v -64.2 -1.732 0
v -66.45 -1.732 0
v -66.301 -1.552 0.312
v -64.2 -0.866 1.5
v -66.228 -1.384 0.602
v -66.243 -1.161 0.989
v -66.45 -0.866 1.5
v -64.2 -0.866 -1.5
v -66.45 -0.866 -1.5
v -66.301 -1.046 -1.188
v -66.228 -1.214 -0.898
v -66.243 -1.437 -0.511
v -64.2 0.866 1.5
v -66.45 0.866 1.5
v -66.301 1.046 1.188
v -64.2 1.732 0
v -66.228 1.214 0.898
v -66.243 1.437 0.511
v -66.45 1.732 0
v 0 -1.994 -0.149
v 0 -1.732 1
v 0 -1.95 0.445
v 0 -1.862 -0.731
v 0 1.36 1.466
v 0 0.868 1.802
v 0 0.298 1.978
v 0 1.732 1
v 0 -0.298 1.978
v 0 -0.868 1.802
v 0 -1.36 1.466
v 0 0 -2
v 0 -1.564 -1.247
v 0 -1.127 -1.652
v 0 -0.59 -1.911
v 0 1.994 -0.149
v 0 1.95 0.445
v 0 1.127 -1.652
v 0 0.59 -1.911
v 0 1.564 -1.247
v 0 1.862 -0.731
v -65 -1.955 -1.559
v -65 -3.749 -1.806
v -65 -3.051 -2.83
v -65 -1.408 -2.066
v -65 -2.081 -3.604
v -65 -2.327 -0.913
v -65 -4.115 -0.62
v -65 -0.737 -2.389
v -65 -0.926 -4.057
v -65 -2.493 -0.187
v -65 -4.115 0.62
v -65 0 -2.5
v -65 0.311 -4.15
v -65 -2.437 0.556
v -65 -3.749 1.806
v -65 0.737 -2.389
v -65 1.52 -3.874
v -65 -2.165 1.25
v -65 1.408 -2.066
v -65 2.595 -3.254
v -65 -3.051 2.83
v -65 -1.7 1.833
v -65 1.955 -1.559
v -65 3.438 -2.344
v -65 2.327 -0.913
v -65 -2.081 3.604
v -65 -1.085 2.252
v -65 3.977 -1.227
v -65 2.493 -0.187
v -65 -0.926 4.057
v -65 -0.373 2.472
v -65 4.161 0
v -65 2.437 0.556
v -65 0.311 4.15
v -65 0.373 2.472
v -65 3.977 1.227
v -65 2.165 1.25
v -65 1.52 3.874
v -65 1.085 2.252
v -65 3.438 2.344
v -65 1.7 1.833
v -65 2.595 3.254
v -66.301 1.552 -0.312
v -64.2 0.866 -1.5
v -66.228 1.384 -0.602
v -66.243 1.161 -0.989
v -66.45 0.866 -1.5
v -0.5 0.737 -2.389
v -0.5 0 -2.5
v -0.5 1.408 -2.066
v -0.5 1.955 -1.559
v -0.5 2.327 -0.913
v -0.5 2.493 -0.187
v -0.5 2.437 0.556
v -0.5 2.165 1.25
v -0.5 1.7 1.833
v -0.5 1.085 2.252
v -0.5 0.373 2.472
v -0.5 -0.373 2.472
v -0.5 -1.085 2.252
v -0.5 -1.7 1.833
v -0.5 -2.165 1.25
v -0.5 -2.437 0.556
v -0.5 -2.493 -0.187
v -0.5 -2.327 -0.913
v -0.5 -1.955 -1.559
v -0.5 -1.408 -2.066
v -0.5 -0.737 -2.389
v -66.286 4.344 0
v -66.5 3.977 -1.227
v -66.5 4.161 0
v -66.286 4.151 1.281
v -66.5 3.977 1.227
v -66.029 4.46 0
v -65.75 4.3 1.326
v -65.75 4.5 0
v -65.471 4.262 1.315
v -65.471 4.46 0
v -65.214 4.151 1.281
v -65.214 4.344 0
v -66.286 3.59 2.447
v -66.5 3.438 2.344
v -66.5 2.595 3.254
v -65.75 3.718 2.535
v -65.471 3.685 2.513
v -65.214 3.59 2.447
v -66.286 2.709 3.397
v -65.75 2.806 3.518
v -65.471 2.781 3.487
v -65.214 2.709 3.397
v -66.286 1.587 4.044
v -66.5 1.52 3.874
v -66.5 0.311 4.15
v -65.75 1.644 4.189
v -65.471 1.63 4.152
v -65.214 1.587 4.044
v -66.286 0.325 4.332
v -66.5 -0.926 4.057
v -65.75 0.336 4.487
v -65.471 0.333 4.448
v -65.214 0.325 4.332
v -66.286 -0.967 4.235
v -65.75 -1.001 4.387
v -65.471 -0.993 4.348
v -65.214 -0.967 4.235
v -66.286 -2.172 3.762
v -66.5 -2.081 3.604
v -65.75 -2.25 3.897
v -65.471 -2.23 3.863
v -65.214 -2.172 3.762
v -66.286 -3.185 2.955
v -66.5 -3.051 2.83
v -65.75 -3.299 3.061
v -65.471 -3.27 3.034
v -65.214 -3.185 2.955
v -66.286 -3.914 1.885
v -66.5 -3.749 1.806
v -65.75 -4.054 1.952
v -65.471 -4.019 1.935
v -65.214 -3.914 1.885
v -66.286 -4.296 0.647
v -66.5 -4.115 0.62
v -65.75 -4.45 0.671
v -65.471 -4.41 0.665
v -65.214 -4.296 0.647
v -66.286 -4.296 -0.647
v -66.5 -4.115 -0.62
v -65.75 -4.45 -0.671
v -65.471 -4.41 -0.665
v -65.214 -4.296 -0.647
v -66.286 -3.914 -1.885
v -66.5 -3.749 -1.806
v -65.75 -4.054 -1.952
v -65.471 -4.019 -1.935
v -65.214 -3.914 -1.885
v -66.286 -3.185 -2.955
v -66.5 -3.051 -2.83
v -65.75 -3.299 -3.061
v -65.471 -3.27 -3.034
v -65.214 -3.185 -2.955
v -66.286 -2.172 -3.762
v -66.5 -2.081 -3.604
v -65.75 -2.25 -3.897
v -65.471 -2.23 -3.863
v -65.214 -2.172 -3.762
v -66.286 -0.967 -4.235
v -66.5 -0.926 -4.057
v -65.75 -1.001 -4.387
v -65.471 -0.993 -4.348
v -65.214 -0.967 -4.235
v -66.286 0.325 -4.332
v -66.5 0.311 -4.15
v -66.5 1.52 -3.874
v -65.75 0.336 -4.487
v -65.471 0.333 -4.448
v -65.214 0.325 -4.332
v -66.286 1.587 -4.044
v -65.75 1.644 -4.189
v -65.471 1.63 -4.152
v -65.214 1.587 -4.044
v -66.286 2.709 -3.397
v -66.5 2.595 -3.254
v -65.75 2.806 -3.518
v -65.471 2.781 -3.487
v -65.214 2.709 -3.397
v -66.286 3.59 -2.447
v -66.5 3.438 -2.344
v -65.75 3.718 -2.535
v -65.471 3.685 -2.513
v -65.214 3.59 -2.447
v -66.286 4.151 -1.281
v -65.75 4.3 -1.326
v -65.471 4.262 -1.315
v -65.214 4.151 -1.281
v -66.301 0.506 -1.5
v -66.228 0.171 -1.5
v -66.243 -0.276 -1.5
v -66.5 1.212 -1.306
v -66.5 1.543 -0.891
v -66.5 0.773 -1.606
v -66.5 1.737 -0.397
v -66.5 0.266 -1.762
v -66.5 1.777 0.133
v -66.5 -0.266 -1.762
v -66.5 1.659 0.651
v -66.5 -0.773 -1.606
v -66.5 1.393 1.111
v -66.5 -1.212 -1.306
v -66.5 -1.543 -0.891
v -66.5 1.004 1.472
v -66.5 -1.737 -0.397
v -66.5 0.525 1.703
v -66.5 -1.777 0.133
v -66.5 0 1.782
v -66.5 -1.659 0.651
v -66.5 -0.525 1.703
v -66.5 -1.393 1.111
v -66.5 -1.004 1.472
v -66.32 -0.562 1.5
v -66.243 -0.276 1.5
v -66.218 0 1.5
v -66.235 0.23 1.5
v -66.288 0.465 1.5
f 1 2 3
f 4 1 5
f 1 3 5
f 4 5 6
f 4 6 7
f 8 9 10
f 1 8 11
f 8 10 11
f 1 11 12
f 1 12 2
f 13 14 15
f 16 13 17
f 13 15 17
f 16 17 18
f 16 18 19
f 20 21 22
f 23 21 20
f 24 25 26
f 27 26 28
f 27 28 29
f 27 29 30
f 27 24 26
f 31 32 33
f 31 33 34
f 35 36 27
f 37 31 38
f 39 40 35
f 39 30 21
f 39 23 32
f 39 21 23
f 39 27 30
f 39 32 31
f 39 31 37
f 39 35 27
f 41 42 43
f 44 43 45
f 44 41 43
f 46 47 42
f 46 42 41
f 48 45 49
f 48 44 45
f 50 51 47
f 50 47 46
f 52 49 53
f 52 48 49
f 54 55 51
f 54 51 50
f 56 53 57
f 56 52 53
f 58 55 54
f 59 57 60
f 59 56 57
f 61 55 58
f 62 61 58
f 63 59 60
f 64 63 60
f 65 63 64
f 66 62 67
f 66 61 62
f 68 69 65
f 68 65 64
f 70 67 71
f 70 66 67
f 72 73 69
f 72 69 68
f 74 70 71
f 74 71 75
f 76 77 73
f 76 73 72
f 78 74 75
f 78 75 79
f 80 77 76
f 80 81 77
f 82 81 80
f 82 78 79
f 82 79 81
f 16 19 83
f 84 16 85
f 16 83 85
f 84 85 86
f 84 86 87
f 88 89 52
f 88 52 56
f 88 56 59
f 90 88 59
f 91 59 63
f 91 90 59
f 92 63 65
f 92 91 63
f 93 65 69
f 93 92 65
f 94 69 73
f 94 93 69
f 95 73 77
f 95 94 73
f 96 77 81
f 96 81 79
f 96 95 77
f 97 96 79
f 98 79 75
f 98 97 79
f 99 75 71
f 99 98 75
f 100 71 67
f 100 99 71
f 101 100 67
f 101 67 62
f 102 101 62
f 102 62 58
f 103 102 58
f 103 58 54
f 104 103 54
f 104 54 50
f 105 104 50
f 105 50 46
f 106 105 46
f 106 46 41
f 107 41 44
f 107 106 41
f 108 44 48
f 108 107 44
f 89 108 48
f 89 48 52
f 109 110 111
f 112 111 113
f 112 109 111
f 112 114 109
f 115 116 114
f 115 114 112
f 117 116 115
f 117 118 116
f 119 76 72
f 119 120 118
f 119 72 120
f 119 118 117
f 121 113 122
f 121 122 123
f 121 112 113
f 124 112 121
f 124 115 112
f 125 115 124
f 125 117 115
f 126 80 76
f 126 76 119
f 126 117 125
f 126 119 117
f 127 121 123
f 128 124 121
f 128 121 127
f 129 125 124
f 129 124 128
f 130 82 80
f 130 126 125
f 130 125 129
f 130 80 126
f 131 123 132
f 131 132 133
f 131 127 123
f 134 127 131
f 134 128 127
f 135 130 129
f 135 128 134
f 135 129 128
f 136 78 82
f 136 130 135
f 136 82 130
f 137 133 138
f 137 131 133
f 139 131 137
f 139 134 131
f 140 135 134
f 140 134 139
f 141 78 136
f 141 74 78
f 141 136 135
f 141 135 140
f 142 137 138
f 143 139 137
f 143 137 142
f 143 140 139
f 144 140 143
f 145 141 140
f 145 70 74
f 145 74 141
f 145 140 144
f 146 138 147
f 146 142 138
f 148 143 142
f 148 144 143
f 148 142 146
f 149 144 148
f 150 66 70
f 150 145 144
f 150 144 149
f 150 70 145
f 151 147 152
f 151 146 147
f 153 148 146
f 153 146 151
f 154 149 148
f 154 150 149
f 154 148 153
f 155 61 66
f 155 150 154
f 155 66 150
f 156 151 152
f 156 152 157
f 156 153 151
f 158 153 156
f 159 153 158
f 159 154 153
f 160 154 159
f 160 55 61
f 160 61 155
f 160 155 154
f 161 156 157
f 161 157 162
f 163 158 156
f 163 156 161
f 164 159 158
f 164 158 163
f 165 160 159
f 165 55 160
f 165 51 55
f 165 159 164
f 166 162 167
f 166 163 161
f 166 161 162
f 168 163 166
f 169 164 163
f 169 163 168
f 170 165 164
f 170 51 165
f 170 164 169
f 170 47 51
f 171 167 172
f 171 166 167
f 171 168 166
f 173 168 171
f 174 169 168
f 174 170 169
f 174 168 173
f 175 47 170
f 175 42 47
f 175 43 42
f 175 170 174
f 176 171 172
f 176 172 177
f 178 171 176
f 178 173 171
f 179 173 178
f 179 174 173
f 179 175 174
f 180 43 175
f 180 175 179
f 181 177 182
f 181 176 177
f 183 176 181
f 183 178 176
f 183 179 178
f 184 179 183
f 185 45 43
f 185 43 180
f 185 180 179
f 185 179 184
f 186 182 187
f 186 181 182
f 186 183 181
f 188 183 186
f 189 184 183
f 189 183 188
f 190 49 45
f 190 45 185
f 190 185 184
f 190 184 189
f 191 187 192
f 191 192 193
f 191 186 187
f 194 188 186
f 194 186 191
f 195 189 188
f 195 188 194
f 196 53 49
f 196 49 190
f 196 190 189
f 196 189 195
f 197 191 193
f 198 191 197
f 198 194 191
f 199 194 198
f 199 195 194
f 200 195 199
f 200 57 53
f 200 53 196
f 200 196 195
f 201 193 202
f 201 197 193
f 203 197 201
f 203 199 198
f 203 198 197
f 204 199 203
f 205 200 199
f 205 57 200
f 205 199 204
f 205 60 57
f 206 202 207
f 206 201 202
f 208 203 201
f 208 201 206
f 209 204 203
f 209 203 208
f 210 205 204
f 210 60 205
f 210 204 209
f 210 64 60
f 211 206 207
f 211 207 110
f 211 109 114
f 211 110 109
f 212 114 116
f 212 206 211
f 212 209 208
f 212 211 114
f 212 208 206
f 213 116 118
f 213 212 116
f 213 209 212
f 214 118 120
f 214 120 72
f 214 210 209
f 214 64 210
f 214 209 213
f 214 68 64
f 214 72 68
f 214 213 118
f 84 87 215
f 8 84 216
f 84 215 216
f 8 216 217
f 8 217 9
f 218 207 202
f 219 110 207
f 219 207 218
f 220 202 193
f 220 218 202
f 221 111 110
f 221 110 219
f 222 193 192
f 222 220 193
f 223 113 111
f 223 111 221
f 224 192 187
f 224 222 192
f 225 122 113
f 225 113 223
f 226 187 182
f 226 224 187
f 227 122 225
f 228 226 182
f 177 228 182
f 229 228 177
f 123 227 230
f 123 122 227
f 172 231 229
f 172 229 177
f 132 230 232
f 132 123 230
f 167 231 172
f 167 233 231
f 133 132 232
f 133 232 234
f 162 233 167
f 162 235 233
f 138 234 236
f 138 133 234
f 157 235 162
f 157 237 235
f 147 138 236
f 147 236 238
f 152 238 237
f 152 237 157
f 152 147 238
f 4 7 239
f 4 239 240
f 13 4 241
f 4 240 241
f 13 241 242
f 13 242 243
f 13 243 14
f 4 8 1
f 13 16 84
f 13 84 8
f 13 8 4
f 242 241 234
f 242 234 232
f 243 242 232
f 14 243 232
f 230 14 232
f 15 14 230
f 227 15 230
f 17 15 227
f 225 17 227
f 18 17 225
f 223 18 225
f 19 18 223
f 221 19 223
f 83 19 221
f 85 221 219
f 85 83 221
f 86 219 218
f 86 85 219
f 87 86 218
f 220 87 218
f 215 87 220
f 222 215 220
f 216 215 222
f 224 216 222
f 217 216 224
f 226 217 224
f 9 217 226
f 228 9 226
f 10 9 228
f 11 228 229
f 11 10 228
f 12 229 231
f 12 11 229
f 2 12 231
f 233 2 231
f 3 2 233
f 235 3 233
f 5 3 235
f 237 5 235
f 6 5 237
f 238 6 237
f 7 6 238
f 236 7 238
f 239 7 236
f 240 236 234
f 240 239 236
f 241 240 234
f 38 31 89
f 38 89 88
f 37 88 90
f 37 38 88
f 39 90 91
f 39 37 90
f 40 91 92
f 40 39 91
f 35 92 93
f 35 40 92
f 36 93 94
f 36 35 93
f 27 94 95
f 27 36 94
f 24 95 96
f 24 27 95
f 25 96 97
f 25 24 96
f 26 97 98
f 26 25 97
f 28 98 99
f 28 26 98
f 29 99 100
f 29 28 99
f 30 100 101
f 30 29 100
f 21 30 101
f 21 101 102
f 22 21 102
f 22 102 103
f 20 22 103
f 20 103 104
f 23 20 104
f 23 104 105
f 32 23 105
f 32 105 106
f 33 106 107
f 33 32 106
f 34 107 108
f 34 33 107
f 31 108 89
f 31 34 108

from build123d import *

# Parameters (mm, degrees)
SKETCH2_R           = 2.5
BOSS_EXTRUDE1_DEPTH = 65
CHAMFER1_SIZE       = 0.5
CUT_EXTRUDE1_DEPTH  = 2.3
SKETCH8_R           = 1.782050808
CUT_EXTRUDE2_DEPTH  = 1
CUT_EXTRUDE2_TAPER  = 45


with BuildPart() as part:
    # Sketch2 → Boss-Extrude1 (new body)
    with BuildSketch(Plane(origin=(0, 0, 0), x_dir=(0, 0, -1), z_dir=(1, 0, 0))):
        Circle(SKETCH2_R)
    extrude(amount=-BOSS_EXTRUDE1_DEPTH)

    # Chamfer1
    chamfer1_edges = [part.edges().sort_by_distance(p)[0] for p in [
        (0, 0, 2.5),
    ]]
    chamfer(chamfer1_edges, length=CHAMFER1_SIZE)

    # Sketch6 → Revolve1 (revolve)
    with BuildSketch(Plane.XY):
        with BuildLine():
            Line((-66.5, 0), (-66.5, 4.161437828))
            ThreePointArc((-66.5, 4.161437828), (-65.75, 4.5), (-65, 4.161437828))
            Line((-65, 4.161437828), (-65, 0))
            Line((-65, 0), (-66.5, 0))
        make_face()
    revolve(axis=Axis((-65, 0, 0), (1, 0, 0)))

    # Sketch7 → Cut-Extrude1 (cut)
    with BuildSketch(Plane.ZY.offset(66.5)):
        Polygon((0, 1.732050808), (-1.5, 0.866025404), (-1.5, -0.866025404), (0, -1.732050808), (1.5, -0.866025404), (1.5, 0.866025404), align=None)
    extrude(amount=-CUT_EXTRUDE1_DEPTH, mode=Mode.SUBTRACT)

    # Sketch8 → Cut-Extrude2 (cut)
    with BuildSketch(Plane.ZY.offset(66.5)):
        Circle(SKETCH8_R)
    extrude(amount=-CUT_EXTRUDE2_DEPTH, taper=CUT_EXTRUDE2_TAPER, mode=Mode.SUBTRACT)


solid = part.part
